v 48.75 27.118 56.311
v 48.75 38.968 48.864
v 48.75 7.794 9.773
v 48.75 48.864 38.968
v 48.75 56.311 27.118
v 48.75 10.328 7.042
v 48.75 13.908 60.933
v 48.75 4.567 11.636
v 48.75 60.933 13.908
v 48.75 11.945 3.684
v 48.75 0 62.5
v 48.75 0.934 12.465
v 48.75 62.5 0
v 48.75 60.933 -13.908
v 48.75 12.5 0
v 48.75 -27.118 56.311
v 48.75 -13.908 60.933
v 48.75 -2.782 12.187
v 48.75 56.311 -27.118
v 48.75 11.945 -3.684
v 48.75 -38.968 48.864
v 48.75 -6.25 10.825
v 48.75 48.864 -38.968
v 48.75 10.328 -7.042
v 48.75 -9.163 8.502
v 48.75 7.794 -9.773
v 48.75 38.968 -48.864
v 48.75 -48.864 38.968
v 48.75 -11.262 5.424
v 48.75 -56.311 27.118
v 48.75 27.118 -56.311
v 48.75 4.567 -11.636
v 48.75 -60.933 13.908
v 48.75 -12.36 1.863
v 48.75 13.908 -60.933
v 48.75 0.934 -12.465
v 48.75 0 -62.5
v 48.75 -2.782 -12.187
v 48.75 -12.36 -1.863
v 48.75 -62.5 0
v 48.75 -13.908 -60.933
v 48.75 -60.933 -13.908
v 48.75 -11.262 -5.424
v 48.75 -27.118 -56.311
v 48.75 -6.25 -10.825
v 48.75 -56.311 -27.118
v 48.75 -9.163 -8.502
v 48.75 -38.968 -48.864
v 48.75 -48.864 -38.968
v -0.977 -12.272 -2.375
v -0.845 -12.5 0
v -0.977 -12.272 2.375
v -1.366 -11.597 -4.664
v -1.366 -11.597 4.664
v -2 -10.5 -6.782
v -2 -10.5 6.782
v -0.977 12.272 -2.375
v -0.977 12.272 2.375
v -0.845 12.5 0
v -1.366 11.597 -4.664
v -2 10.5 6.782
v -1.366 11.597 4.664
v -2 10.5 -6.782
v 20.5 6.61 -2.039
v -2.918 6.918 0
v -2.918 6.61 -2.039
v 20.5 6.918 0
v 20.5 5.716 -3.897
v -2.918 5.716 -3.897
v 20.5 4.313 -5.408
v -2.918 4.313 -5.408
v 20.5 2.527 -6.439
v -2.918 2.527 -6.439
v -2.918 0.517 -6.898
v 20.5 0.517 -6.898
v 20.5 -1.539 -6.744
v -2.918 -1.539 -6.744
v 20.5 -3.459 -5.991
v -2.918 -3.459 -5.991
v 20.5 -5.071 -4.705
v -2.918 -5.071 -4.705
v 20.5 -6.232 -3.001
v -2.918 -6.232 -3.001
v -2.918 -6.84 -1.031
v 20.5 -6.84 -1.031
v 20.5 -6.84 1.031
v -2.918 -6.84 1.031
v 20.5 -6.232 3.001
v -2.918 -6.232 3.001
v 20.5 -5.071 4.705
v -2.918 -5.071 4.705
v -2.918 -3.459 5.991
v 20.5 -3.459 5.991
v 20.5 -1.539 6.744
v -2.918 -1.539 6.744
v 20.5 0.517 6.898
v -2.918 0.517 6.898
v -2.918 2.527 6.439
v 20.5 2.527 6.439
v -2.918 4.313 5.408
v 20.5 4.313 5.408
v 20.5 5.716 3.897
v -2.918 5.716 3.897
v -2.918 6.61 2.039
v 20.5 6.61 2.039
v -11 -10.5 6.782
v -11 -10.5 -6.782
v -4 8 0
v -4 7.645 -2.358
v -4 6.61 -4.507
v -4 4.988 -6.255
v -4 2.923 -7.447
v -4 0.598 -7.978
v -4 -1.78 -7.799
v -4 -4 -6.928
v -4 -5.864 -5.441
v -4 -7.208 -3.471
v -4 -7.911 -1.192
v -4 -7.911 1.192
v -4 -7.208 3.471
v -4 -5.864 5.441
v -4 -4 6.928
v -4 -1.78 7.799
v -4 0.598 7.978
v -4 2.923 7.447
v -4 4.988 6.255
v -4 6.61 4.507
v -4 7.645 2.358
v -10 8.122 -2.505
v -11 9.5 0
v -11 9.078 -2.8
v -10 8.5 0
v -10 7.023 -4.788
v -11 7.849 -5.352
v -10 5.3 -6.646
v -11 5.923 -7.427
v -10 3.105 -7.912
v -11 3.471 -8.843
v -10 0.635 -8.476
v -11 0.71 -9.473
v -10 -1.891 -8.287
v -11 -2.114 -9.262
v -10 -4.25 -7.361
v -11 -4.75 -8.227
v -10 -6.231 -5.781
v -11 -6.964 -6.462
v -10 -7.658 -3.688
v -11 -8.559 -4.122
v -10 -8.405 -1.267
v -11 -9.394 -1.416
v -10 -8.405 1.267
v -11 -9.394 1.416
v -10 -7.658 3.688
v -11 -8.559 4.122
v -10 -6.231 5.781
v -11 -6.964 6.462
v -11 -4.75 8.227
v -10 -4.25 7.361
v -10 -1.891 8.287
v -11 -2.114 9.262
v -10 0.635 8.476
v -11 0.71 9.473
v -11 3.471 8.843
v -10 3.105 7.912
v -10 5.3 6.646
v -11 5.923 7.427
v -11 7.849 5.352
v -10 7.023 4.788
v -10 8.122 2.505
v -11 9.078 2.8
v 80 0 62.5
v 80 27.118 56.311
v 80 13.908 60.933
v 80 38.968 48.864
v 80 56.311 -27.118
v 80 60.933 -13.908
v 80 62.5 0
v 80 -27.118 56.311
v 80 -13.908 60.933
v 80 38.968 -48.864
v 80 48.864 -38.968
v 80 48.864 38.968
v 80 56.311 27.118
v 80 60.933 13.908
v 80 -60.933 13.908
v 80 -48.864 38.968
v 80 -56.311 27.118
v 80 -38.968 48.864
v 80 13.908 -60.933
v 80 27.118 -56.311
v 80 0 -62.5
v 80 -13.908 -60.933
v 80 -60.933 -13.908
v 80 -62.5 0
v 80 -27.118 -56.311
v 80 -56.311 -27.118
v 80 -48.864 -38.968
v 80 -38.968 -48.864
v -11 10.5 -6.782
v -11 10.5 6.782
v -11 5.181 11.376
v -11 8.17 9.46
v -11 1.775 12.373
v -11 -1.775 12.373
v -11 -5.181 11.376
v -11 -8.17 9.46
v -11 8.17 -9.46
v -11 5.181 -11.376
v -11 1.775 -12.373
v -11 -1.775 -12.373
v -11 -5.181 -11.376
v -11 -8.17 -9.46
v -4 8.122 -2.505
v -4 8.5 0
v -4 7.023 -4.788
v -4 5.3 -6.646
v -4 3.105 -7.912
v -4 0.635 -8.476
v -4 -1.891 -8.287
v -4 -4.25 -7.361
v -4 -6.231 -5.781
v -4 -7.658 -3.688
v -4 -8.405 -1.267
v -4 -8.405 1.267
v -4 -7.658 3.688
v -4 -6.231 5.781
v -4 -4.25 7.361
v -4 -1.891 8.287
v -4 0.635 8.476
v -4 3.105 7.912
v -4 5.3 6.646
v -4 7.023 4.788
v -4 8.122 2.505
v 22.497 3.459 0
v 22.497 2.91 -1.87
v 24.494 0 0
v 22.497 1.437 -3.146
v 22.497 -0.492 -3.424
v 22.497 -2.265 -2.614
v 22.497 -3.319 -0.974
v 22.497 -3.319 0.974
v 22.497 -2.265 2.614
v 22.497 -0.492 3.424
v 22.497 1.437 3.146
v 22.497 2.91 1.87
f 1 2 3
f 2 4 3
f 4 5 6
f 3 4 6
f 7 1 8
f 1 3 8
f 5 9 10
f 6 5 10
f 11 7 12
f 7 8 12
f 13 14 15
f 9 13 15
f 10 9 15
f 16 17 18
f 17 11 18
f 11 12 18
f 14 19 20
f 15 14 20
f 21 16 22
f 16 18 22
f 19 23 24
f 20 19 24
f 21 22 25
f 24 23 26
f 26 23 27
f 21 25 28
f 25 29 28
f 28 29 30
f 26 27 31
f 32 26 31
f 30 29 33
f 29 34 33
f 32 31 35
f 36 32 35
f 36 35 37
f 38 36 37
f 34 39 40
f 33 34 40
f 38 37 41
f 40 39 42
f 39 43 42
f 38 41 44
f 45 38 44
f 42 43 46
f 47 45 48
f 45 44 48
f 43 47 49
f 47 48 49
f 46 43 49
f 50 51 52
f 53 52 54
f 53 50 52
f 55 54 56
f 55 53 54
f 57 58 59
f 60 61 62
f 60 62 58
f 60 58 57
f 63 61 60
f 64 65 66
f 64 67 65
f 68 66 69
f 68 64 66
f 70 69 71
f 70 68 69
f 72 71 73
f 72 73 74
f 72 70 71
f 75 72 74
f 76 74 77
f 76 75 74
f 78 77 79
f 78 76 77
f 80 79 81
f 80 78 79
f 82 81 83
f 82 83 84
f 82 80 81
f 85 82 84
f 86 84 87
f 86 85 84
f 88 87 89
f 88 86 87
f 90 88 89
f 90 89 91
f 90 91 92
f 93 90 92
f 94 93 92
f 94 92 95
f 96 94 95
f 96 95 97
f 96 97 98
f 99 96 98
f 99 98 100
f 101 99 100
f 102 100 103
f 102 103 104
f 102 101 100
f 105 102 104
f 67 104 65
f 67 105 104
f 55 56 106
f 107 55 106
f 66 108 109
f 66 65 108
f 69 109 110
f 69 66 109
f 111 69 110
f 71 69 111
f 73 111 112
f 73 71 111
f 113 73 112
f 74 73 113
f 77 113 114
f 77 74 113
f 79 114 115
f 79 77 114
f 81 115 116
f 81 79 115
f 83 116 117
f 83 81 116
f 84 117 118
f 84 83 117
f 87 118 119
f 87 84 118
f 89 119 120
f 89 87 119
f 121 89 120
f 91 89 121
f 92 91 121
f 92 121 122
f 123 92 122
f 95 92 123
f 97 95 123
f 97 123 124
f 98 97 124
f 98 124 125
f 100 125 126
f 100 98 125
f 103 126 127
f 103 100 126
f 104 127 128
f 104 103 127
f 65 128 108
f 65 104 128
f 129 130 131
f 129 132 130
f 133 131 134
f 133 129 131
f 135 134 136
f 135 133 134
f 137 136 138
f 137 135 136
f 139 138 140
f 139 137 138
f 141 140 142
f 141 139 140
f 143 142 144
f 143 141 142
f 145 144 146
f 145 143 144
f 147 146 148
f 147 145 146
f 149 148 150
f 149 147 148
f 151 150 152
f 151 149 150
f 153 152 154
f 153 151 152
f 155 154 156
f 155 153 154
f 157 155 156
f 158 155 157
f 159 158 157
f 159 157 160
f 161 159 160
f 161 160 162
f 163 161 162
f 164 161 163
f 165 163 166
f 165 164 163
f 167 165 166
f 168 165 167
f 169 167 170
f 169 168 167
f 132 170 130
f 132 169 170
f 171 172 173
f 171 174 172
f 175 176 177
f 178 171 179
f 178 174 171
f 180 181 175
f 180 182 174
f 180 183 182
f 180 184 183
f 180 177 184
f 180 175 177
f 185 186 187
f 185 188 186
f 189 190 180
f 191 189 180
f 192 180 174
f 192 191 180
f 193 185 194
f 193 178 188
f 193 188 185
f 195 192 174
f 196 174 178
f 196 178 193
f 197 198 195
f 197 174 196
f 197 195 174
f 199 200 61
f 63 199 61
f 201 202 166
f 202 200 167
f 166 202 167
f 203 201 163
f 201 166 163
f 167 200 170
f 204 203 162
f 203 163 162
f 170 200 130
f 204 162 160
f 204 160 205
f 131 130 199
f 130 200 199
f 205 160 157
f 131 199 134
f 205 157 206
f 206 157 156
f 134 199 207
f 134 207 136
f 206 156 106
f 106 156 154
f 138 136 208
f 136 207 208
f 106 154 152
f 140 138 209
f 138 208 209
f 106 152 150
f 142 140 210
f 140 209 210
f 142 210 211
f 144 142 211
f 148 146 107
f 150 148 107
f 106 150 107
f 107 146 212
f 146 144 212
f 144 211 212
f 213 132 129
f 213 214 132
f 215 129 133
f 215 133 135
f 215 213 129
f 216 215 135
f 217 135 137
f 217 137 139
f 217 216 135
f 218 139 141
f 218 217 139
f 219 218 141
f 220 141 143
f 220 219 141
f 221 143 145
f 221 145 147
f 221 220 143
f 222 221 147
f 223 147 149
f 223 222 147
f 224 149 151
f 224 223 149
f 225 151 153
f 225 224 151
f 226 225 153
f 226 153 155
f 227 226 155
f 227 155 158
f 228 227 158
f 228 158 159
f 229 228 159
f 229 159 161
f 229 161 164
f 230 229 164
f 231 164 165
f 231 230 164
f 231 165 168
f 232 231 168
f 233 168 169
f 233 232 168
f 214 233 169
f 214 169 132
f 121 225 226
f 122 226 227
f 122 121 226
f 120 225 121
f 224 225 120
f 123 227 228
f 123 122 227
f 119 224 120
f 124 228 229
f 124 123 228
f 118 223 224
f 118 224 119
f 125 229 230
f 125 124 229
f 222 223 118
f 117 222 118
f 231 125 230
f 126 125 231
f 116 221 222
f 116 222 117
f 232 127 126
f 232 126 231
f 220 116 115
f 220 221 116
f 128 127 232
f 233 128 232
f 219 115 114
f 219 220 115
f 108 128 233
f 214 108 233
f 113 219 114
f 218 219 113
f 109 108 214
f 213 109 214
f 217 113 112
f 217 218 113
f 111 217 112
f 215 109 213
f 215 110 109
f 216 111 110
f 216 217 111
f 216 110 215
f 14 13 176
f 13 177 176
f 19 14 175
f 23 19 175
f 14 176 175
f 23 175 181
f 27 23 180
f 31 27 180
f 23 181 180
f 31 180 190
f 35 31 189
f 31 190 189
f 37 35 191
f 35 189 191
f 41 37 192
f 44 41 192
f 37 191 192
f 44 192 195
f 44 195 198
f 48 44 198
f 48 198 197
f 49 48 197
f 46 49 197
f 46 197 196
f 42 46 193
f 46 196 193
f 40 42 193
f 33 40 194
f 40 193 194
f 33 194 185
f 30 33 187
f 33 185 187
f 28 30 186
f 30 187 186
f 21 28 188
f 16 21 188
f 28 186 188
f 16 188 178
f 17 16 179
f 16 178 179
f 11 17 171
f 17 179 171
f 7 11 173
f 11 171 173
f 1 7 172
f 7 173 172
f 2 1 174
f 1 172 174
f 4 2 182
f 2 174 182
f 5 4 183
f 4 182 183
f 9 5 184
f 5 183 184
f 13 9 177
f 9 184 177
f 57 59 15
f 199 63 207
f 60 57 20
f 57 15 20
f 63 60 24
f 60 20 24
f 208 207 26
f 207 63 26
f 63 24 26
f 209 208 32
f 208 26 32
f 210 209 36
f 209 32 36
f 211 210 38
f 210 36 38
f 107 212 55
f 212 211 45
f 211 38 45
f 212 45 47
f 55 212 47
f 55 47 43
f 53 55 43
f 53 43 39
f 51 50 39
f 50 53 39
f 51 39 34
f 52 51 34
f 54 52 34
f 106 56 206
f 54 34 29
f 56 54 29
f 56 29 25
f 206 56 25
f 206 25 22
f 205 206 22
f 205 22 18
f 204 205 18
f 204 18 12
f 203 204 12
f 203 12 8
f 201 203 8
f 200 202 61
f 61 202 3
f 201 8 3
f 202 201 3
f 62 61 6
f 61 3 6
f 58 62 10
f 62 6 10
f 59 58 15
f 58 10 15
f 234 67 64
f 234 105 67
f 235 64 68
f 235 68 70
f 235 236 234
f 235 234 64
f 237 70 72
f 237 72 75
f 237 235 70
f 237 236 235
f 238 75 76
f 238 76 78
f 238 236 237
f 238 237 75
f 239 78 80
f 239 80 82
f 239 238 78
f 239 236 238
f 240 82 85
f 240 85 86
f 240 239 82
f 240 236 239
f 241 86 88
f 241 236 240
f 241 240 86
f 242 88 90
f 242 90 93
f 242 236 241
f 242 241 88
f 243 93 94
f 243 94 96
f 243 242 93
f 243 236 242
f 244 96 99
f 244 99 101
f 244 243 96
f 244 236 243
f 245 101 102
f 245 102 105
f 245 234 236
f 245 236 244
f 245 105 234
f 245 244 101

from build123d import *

# Parameters (mm, degrees)
SKETCH1_W               = 91
SKETCH1_H               = 12.5
SKETCH2_W               = 31.25
SKETCH2_H               = 62.5
CUT_EXTRUDE1_DEPTH      = 25
CUT_EXTRUDE1_DEPTH_BACK = 25


with BuildPart() as part:
    # Sketch1 → Revolve1 (revolve)
    with BuildSketch(Plane.XY):
        with Locations((34.5, 6.25)):
            Rectangle(SKETCH1_W, SKETCH1_H)
    revolve(axis=Axis((80, 0, 0), (-1, 0, 0)))

    # Sketch2 → Revolve2 (revolve)
    with BuildSketch(Plane.XY):
        with Locations((64.375, 31.25)):
            Rectangle(SKETCH2_W, SKETCH2_H)
    revolve(axis=Axis((80, 0, 0), (-1, 0, 0)))

    # Sketch3 → Cut-Extrude1 (cut, two sides: drawn at the far end of the back side and taken through both)
    with BuildSketch(Plane.XY.offset(-CUT_EXTRUDE1_DEPTH_BACK)):
        Polygon((-67, -28), (8.103629711, -28), (-2, -10.5), (-11, -10.5), (-11, -15.5), (-56, -15.5), (-56, 15.5), (-11, 15.5), (-11, 10.5), (-2, 10.5), (8.103629711, 28), (-67, 28), align=None)
    extrude(amount=CUT_EXTRUDE1_DEPTH + CUT_EXTRUDE1_DEPTH_BACK, mode=Mode.SUBTRACT)

    # Sketch4 → Cut-Revolve1 (revolve, cut)
    with BuildSketch(Plane.XY):
        Polygon((-11, 0), (-11, 9.5), (-10, 8.5), (-4, 8.5), (-4, 8), (-2.9175, 6.9175), (20.5, 6.9175), (24.493820487, 0), align=None)
    revolve(axis=Axis((24.493820487, 0, 0), (-1, 0, 0)), mode=Mode.SUBTRACT)


solid = part.part
